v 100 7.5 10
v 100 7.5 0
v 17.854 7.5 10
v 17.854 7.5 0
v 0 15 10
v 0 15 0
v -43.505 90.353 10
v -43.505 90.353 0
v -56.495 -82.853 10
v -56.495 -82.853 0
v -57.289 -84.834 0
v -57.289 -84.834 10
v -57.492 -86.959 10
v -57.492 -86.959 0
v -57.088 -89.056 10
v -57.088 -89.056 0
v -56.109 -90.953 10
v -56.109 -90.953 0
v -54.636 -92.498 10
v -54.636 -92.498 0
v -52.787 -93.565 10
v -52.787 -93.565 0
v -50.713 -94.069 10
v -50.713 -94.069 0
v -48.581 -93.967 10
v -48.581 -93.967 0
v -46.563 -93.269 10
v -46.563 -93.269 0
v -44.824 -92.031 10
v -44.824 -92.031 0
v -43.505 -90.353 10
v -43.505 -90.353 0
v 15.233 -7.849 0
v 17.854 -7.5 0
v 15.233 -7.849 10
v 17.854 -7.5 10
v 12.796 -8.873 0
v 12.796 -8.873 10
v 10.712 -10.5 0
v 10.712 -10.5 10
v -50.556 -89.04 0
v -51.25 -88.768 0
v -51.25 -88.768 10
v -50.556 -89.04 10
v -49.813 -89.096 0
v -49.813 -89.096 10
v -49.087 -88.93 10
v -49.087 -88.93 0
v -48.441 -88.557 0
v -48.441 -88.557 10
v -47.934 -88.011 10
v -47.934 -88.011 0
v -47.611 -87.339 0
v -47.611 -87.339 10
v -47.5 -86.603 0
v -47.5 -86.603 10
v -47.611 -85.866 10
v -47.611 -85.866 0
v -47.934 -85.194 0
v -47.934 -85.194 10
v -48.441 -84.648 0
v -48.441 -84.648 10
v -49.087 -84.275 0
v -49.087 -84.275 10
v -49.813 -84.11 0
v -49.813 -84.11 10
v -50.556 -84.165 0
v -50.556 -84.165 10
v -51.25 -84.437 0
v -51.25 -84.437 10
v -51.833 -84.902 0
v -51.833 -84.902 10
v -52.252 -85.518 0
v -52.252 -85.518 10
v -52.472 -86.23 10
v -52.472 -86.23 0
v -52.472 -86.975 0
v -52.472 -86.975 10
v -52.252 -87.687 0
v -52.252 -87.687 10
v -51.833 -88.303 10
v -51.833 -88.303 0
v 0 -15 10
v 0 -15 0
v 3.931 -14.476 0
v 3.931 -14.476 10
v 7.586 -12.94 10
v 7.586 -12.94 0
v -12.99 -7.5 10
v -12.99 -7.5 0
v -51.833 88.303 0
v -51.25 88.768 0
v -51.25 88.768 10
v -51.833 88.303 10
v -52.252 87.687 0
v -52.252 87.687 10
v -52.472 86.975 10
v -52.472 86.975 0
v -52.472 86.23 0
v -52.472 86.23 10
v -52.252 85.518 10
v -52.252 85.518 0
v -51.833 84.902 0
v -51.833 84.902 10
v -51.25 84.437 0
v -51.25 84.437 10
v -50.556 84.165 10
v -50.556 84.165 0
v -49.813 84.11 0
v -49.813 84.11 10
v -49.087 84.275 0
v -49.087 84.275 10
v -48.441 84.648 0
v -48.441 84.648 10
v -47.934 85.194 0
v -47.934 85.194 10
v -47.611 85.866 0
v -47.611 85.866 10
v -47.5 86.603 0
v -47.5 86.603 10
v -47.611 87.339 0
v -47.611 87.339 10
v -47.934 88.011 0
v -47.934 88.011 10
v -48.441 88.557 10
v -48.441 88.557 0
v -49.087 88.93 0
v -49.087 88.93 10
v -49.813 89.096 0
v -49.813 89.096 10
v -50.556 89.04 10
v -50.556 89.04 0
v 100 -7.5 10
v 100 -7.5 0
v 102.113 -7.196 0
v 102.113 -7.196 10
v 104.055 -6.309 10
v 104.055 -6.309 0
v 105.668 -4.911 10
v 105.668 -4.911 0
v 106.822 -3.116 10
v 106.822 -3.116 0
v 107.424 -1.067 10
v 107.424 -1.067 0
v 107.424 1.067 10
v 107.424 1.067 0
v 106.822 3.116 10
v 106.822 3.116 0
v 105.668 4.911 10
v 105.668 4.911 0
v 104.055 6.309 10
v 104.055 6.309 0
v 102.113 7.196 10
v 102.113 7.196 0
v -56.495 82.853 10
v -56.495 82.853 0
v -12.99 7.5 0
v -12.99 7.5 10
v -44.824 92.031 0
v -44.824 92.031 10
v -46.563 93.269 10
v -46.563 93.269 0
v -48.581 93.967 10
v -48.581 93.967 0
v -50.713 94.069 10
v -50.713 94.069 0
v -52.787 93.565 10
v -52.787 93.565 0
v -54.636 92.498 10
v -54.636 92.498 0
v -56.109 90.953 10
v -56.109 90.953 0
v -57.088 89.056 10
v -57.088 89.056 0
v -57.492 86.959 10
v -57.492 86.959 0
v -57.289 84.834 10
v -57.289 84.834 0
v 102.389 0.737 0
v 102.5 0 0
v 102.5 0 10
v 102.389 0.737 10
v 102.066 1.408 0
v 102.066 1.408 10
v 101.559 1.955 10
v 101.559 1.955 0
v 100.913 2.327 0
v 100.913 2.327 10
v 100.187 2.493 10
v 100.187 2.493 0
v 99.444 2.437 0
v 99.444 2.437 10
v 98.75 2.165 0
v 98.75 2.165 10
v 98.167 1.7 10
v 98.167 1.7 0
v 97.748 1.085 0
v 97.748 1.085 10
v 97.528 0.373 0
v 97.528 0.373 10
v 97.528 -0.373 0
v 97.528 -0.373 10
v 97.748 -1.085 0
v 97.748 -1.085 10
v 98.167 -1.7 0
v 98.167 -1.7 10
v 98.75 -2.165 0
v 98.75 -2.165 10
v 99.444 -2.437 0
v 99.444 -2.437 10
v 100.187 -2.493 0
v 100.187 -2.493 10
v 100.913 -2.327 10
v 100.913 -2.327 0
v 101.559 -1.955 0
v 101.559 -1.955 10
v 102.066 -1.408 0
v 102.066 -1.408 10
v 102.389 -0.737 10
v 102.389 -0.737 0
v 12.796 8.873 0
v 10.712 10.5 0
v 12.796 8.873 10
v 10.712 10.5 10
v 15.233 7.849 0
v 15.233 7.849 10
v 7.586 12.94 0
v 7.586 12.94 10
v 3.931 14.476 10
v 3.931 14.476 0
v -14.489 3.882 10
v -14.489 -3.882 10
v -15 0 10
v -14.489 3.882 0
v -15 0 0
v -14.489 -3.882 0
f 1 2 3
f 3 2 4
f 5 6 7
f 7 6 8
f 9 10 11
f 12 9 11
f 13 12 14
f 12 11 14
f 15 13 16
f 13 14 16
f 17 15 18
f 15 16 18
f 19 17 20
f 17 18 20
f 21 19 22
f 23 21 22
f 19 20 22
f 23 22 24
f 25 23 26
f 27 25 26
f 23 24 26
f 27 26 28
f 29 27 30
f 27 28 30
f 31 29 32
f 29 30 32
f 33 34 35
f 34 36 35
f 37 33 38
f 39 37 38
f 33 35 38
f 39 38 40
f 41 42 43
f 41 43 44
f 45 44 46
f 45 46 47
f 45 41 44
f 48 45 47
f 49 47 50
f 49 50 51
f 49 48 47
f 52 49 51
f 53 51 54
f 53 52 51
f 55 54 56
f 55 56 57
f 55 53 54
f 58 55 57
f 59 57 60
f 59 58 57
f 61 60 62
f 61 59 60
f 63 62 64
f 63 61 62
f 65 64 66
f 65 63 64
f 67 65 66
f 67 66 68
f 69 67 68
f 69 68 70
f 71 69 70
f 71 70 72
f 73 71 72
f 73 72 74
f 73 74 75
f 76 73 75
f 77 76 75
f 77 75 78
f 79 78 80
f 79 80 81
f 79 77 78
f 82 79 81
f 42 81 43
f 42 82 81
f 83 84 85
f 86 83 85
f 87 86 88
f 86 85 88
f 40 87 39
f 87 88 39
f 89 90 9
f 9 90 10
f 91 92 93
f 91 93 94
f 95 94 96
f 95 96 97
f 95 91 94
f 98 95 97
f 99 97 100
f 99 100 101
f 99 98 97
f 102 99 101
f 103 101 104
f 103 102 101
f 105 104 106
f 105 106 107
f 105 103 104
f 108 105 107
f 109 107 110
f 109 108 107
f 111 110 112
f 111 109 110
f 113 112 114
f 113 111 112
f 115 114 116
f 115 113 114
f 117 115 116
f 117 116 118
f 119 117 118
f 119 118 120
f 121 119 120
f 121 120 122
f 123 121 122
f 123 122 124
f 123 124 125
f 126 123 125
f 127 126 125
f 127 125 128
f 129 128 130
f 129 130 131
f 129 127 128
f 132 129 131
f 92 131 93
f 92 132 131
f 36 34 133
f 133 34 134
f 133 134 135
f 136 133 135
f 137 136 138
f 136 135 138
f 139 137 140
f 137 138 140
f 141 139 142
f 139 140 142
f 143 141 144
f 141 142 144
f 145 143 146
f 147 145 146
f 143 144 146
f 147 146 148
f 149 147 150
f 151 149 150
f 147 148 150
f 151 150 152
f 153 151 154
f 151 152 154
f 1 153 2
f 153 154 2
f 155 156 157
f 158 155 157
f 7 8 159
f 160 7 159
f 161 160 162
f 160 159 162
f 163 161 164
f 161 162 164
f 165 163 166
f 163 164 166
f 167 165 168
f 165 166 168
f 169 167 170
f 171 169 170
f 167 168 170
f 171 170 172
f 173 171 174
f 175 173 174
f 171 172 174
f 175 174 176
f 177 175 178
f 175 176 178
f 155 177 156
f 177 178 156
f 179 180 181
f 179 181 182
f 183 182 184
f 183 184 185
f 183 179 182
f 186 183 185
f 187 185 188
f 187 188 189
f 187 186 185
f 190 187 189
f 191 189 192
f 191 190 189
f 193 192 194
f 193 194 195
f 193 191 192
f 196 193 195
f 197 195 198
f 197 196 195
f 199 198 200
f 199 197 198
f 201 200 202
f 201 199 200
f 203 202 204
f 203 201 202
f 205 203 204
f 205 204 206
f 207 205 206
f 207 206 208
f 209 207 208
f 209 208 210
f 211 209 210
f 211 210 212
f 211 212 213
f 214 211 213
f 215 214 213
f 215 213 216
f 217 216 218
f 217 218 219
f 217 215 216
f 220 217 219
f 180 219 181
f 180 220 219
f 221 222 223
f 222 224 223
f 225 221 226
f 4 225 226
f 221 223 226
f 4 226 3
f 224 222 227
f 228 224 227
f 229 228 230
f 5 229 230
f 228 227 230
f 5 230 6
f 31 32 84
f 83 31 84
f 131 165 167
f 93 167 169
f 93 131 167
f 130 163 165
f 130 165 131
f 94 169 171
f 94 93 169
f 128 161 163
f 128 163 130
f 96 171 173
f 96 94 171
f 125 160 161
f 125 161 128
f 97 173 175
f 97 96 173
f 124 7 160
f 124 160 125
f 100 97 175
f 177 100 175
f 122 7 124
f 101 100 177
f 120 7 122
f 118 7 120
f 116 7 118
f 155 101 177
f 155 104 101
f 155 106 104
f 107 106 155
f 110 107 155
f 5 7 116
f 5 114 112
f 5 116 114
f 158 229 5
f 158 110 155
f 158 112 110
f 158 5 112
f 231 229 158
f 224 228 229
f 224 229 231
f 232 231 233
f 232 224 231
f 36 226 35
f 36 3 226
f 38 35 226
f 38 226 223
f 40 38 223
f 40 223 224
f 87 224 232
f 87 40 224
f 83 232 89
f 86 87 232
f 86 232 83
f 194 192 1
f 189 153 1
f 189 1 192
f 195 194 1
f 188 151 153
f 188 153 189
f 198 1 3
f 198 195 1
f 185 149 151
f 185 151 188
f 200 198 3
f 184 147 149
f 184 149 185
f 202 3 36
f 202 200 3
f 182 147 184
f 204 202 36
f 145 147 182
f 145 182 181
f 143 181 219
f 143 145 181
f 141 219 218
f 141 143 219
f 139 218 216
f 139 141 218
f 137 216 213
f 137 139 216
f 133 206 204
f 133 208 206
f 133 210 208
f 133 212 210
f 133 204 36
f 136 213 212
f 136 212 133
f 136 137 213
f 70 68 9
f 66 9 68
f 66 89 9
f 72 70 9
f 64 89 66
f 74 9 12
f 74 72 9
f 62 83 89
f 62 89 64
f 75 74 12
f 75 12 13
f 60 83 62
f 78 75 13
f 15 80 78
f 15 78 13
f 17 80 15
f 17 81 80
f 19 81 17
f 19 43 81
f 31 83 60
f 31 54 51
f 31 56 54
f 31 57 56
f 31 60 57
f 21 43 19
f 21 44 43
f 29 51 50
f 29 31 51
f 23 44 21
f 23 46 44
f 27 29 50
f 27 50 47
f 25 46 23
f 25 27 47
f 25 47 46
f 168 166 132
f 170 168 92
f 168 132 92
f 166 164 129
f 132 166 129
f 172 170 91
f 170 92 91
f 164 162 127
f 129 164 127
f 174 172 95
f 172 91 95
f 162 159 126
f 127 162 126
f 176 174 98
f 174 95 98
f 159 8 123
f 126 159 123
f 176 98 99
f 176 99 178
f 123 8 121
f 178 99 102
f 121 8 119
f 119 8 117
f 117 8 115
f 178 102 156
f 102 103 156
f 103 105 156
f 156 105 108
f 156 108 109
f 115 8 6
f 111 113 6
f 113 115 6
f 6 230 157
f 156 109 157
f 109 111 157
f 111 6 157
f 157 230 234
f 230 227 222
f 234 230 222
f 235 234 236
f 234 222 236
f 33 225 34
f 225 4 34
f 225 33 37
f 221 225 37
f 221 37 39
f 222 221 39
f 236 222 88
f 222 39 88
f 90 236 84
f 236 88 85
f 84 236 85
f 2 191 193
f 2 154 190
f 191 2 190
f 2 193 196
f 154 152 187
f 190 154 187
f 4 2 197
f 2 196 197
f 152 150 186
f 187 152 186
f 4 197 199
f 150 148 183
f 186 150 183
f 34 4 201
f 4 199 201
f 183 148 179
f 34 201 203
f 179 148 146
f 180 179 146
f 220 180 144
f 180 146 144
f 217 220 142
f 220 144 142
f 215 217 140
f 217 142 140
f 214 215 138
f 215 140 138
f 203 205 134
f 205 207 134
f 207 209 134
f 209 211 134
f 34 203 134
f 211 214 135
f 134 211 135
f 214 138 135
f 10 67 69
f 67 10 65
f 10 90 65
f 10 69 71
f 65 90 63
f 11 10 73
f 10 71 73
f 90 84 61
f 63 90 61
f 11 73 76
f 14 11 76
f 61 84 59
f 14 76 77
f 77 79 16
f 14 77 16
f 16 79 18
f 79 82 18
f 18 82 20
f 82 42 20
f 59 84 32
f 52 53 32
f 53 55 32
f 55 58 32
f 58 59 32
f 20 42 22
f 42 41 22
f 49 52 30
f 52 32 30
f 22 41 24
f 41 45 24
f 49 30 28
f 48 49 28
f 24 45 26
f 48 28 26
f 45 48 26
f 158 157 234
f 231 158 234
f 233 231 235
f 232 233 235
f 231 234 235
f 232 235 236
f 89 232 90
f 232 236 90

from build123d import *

# Parameters (mm, degrees)
SKETCH1_R           = 2.5
BOSS_EXTRUDE1_DEPTH = 10
FILLET1_R           = 10
CIRPATTERN1_COUNT   = 3


with BuildPart() as part:
    # Sketch1 → Boss-Extrude1 (new body)
    with BuildSketch(Plane.XY):
        with BuildLine():
            Line((100, 7.5), (12.990381057, 7.5))
            ThreePointArc((12.990381057, 7.5), (-15, 0), (12.990381057, -7.5))
            Line((12.990381057, -7.5), (100, -7.5))
            ThreePointArc((100, -7.5), (107.5, 0), (100, 7.5))
        make_face()
        with Locations((100, 0)):
            Circle(SKETCH1_R, mode=Mode.SUBTRACT)
    boss_extrude1 = extrude(amount=BOSS_EXTRUDE1_DEPTH)

    # Fillet1
    fillet1_edges = [part.edges().sort_by_distance(p)[0] for p in [
        (12.990381057, 7.5, 5),
        (12.990381057, -7.5, 5),
    ]]
    fillet(fillet1_edges, radius=FILLET1_R)

    # CirPattern1: Boss-Extrude1 ×3 about axis
    cirpattern1_axis = Axis((0, 0, 10), (0, 0, -1))
    for i in range(1, CIRPATTERN1_COUNT):
        add(boss_extrude1.rotate(cirpattern1_axis, i * 360 / CIRPATTERN1_COUNT))


solid = part.part
